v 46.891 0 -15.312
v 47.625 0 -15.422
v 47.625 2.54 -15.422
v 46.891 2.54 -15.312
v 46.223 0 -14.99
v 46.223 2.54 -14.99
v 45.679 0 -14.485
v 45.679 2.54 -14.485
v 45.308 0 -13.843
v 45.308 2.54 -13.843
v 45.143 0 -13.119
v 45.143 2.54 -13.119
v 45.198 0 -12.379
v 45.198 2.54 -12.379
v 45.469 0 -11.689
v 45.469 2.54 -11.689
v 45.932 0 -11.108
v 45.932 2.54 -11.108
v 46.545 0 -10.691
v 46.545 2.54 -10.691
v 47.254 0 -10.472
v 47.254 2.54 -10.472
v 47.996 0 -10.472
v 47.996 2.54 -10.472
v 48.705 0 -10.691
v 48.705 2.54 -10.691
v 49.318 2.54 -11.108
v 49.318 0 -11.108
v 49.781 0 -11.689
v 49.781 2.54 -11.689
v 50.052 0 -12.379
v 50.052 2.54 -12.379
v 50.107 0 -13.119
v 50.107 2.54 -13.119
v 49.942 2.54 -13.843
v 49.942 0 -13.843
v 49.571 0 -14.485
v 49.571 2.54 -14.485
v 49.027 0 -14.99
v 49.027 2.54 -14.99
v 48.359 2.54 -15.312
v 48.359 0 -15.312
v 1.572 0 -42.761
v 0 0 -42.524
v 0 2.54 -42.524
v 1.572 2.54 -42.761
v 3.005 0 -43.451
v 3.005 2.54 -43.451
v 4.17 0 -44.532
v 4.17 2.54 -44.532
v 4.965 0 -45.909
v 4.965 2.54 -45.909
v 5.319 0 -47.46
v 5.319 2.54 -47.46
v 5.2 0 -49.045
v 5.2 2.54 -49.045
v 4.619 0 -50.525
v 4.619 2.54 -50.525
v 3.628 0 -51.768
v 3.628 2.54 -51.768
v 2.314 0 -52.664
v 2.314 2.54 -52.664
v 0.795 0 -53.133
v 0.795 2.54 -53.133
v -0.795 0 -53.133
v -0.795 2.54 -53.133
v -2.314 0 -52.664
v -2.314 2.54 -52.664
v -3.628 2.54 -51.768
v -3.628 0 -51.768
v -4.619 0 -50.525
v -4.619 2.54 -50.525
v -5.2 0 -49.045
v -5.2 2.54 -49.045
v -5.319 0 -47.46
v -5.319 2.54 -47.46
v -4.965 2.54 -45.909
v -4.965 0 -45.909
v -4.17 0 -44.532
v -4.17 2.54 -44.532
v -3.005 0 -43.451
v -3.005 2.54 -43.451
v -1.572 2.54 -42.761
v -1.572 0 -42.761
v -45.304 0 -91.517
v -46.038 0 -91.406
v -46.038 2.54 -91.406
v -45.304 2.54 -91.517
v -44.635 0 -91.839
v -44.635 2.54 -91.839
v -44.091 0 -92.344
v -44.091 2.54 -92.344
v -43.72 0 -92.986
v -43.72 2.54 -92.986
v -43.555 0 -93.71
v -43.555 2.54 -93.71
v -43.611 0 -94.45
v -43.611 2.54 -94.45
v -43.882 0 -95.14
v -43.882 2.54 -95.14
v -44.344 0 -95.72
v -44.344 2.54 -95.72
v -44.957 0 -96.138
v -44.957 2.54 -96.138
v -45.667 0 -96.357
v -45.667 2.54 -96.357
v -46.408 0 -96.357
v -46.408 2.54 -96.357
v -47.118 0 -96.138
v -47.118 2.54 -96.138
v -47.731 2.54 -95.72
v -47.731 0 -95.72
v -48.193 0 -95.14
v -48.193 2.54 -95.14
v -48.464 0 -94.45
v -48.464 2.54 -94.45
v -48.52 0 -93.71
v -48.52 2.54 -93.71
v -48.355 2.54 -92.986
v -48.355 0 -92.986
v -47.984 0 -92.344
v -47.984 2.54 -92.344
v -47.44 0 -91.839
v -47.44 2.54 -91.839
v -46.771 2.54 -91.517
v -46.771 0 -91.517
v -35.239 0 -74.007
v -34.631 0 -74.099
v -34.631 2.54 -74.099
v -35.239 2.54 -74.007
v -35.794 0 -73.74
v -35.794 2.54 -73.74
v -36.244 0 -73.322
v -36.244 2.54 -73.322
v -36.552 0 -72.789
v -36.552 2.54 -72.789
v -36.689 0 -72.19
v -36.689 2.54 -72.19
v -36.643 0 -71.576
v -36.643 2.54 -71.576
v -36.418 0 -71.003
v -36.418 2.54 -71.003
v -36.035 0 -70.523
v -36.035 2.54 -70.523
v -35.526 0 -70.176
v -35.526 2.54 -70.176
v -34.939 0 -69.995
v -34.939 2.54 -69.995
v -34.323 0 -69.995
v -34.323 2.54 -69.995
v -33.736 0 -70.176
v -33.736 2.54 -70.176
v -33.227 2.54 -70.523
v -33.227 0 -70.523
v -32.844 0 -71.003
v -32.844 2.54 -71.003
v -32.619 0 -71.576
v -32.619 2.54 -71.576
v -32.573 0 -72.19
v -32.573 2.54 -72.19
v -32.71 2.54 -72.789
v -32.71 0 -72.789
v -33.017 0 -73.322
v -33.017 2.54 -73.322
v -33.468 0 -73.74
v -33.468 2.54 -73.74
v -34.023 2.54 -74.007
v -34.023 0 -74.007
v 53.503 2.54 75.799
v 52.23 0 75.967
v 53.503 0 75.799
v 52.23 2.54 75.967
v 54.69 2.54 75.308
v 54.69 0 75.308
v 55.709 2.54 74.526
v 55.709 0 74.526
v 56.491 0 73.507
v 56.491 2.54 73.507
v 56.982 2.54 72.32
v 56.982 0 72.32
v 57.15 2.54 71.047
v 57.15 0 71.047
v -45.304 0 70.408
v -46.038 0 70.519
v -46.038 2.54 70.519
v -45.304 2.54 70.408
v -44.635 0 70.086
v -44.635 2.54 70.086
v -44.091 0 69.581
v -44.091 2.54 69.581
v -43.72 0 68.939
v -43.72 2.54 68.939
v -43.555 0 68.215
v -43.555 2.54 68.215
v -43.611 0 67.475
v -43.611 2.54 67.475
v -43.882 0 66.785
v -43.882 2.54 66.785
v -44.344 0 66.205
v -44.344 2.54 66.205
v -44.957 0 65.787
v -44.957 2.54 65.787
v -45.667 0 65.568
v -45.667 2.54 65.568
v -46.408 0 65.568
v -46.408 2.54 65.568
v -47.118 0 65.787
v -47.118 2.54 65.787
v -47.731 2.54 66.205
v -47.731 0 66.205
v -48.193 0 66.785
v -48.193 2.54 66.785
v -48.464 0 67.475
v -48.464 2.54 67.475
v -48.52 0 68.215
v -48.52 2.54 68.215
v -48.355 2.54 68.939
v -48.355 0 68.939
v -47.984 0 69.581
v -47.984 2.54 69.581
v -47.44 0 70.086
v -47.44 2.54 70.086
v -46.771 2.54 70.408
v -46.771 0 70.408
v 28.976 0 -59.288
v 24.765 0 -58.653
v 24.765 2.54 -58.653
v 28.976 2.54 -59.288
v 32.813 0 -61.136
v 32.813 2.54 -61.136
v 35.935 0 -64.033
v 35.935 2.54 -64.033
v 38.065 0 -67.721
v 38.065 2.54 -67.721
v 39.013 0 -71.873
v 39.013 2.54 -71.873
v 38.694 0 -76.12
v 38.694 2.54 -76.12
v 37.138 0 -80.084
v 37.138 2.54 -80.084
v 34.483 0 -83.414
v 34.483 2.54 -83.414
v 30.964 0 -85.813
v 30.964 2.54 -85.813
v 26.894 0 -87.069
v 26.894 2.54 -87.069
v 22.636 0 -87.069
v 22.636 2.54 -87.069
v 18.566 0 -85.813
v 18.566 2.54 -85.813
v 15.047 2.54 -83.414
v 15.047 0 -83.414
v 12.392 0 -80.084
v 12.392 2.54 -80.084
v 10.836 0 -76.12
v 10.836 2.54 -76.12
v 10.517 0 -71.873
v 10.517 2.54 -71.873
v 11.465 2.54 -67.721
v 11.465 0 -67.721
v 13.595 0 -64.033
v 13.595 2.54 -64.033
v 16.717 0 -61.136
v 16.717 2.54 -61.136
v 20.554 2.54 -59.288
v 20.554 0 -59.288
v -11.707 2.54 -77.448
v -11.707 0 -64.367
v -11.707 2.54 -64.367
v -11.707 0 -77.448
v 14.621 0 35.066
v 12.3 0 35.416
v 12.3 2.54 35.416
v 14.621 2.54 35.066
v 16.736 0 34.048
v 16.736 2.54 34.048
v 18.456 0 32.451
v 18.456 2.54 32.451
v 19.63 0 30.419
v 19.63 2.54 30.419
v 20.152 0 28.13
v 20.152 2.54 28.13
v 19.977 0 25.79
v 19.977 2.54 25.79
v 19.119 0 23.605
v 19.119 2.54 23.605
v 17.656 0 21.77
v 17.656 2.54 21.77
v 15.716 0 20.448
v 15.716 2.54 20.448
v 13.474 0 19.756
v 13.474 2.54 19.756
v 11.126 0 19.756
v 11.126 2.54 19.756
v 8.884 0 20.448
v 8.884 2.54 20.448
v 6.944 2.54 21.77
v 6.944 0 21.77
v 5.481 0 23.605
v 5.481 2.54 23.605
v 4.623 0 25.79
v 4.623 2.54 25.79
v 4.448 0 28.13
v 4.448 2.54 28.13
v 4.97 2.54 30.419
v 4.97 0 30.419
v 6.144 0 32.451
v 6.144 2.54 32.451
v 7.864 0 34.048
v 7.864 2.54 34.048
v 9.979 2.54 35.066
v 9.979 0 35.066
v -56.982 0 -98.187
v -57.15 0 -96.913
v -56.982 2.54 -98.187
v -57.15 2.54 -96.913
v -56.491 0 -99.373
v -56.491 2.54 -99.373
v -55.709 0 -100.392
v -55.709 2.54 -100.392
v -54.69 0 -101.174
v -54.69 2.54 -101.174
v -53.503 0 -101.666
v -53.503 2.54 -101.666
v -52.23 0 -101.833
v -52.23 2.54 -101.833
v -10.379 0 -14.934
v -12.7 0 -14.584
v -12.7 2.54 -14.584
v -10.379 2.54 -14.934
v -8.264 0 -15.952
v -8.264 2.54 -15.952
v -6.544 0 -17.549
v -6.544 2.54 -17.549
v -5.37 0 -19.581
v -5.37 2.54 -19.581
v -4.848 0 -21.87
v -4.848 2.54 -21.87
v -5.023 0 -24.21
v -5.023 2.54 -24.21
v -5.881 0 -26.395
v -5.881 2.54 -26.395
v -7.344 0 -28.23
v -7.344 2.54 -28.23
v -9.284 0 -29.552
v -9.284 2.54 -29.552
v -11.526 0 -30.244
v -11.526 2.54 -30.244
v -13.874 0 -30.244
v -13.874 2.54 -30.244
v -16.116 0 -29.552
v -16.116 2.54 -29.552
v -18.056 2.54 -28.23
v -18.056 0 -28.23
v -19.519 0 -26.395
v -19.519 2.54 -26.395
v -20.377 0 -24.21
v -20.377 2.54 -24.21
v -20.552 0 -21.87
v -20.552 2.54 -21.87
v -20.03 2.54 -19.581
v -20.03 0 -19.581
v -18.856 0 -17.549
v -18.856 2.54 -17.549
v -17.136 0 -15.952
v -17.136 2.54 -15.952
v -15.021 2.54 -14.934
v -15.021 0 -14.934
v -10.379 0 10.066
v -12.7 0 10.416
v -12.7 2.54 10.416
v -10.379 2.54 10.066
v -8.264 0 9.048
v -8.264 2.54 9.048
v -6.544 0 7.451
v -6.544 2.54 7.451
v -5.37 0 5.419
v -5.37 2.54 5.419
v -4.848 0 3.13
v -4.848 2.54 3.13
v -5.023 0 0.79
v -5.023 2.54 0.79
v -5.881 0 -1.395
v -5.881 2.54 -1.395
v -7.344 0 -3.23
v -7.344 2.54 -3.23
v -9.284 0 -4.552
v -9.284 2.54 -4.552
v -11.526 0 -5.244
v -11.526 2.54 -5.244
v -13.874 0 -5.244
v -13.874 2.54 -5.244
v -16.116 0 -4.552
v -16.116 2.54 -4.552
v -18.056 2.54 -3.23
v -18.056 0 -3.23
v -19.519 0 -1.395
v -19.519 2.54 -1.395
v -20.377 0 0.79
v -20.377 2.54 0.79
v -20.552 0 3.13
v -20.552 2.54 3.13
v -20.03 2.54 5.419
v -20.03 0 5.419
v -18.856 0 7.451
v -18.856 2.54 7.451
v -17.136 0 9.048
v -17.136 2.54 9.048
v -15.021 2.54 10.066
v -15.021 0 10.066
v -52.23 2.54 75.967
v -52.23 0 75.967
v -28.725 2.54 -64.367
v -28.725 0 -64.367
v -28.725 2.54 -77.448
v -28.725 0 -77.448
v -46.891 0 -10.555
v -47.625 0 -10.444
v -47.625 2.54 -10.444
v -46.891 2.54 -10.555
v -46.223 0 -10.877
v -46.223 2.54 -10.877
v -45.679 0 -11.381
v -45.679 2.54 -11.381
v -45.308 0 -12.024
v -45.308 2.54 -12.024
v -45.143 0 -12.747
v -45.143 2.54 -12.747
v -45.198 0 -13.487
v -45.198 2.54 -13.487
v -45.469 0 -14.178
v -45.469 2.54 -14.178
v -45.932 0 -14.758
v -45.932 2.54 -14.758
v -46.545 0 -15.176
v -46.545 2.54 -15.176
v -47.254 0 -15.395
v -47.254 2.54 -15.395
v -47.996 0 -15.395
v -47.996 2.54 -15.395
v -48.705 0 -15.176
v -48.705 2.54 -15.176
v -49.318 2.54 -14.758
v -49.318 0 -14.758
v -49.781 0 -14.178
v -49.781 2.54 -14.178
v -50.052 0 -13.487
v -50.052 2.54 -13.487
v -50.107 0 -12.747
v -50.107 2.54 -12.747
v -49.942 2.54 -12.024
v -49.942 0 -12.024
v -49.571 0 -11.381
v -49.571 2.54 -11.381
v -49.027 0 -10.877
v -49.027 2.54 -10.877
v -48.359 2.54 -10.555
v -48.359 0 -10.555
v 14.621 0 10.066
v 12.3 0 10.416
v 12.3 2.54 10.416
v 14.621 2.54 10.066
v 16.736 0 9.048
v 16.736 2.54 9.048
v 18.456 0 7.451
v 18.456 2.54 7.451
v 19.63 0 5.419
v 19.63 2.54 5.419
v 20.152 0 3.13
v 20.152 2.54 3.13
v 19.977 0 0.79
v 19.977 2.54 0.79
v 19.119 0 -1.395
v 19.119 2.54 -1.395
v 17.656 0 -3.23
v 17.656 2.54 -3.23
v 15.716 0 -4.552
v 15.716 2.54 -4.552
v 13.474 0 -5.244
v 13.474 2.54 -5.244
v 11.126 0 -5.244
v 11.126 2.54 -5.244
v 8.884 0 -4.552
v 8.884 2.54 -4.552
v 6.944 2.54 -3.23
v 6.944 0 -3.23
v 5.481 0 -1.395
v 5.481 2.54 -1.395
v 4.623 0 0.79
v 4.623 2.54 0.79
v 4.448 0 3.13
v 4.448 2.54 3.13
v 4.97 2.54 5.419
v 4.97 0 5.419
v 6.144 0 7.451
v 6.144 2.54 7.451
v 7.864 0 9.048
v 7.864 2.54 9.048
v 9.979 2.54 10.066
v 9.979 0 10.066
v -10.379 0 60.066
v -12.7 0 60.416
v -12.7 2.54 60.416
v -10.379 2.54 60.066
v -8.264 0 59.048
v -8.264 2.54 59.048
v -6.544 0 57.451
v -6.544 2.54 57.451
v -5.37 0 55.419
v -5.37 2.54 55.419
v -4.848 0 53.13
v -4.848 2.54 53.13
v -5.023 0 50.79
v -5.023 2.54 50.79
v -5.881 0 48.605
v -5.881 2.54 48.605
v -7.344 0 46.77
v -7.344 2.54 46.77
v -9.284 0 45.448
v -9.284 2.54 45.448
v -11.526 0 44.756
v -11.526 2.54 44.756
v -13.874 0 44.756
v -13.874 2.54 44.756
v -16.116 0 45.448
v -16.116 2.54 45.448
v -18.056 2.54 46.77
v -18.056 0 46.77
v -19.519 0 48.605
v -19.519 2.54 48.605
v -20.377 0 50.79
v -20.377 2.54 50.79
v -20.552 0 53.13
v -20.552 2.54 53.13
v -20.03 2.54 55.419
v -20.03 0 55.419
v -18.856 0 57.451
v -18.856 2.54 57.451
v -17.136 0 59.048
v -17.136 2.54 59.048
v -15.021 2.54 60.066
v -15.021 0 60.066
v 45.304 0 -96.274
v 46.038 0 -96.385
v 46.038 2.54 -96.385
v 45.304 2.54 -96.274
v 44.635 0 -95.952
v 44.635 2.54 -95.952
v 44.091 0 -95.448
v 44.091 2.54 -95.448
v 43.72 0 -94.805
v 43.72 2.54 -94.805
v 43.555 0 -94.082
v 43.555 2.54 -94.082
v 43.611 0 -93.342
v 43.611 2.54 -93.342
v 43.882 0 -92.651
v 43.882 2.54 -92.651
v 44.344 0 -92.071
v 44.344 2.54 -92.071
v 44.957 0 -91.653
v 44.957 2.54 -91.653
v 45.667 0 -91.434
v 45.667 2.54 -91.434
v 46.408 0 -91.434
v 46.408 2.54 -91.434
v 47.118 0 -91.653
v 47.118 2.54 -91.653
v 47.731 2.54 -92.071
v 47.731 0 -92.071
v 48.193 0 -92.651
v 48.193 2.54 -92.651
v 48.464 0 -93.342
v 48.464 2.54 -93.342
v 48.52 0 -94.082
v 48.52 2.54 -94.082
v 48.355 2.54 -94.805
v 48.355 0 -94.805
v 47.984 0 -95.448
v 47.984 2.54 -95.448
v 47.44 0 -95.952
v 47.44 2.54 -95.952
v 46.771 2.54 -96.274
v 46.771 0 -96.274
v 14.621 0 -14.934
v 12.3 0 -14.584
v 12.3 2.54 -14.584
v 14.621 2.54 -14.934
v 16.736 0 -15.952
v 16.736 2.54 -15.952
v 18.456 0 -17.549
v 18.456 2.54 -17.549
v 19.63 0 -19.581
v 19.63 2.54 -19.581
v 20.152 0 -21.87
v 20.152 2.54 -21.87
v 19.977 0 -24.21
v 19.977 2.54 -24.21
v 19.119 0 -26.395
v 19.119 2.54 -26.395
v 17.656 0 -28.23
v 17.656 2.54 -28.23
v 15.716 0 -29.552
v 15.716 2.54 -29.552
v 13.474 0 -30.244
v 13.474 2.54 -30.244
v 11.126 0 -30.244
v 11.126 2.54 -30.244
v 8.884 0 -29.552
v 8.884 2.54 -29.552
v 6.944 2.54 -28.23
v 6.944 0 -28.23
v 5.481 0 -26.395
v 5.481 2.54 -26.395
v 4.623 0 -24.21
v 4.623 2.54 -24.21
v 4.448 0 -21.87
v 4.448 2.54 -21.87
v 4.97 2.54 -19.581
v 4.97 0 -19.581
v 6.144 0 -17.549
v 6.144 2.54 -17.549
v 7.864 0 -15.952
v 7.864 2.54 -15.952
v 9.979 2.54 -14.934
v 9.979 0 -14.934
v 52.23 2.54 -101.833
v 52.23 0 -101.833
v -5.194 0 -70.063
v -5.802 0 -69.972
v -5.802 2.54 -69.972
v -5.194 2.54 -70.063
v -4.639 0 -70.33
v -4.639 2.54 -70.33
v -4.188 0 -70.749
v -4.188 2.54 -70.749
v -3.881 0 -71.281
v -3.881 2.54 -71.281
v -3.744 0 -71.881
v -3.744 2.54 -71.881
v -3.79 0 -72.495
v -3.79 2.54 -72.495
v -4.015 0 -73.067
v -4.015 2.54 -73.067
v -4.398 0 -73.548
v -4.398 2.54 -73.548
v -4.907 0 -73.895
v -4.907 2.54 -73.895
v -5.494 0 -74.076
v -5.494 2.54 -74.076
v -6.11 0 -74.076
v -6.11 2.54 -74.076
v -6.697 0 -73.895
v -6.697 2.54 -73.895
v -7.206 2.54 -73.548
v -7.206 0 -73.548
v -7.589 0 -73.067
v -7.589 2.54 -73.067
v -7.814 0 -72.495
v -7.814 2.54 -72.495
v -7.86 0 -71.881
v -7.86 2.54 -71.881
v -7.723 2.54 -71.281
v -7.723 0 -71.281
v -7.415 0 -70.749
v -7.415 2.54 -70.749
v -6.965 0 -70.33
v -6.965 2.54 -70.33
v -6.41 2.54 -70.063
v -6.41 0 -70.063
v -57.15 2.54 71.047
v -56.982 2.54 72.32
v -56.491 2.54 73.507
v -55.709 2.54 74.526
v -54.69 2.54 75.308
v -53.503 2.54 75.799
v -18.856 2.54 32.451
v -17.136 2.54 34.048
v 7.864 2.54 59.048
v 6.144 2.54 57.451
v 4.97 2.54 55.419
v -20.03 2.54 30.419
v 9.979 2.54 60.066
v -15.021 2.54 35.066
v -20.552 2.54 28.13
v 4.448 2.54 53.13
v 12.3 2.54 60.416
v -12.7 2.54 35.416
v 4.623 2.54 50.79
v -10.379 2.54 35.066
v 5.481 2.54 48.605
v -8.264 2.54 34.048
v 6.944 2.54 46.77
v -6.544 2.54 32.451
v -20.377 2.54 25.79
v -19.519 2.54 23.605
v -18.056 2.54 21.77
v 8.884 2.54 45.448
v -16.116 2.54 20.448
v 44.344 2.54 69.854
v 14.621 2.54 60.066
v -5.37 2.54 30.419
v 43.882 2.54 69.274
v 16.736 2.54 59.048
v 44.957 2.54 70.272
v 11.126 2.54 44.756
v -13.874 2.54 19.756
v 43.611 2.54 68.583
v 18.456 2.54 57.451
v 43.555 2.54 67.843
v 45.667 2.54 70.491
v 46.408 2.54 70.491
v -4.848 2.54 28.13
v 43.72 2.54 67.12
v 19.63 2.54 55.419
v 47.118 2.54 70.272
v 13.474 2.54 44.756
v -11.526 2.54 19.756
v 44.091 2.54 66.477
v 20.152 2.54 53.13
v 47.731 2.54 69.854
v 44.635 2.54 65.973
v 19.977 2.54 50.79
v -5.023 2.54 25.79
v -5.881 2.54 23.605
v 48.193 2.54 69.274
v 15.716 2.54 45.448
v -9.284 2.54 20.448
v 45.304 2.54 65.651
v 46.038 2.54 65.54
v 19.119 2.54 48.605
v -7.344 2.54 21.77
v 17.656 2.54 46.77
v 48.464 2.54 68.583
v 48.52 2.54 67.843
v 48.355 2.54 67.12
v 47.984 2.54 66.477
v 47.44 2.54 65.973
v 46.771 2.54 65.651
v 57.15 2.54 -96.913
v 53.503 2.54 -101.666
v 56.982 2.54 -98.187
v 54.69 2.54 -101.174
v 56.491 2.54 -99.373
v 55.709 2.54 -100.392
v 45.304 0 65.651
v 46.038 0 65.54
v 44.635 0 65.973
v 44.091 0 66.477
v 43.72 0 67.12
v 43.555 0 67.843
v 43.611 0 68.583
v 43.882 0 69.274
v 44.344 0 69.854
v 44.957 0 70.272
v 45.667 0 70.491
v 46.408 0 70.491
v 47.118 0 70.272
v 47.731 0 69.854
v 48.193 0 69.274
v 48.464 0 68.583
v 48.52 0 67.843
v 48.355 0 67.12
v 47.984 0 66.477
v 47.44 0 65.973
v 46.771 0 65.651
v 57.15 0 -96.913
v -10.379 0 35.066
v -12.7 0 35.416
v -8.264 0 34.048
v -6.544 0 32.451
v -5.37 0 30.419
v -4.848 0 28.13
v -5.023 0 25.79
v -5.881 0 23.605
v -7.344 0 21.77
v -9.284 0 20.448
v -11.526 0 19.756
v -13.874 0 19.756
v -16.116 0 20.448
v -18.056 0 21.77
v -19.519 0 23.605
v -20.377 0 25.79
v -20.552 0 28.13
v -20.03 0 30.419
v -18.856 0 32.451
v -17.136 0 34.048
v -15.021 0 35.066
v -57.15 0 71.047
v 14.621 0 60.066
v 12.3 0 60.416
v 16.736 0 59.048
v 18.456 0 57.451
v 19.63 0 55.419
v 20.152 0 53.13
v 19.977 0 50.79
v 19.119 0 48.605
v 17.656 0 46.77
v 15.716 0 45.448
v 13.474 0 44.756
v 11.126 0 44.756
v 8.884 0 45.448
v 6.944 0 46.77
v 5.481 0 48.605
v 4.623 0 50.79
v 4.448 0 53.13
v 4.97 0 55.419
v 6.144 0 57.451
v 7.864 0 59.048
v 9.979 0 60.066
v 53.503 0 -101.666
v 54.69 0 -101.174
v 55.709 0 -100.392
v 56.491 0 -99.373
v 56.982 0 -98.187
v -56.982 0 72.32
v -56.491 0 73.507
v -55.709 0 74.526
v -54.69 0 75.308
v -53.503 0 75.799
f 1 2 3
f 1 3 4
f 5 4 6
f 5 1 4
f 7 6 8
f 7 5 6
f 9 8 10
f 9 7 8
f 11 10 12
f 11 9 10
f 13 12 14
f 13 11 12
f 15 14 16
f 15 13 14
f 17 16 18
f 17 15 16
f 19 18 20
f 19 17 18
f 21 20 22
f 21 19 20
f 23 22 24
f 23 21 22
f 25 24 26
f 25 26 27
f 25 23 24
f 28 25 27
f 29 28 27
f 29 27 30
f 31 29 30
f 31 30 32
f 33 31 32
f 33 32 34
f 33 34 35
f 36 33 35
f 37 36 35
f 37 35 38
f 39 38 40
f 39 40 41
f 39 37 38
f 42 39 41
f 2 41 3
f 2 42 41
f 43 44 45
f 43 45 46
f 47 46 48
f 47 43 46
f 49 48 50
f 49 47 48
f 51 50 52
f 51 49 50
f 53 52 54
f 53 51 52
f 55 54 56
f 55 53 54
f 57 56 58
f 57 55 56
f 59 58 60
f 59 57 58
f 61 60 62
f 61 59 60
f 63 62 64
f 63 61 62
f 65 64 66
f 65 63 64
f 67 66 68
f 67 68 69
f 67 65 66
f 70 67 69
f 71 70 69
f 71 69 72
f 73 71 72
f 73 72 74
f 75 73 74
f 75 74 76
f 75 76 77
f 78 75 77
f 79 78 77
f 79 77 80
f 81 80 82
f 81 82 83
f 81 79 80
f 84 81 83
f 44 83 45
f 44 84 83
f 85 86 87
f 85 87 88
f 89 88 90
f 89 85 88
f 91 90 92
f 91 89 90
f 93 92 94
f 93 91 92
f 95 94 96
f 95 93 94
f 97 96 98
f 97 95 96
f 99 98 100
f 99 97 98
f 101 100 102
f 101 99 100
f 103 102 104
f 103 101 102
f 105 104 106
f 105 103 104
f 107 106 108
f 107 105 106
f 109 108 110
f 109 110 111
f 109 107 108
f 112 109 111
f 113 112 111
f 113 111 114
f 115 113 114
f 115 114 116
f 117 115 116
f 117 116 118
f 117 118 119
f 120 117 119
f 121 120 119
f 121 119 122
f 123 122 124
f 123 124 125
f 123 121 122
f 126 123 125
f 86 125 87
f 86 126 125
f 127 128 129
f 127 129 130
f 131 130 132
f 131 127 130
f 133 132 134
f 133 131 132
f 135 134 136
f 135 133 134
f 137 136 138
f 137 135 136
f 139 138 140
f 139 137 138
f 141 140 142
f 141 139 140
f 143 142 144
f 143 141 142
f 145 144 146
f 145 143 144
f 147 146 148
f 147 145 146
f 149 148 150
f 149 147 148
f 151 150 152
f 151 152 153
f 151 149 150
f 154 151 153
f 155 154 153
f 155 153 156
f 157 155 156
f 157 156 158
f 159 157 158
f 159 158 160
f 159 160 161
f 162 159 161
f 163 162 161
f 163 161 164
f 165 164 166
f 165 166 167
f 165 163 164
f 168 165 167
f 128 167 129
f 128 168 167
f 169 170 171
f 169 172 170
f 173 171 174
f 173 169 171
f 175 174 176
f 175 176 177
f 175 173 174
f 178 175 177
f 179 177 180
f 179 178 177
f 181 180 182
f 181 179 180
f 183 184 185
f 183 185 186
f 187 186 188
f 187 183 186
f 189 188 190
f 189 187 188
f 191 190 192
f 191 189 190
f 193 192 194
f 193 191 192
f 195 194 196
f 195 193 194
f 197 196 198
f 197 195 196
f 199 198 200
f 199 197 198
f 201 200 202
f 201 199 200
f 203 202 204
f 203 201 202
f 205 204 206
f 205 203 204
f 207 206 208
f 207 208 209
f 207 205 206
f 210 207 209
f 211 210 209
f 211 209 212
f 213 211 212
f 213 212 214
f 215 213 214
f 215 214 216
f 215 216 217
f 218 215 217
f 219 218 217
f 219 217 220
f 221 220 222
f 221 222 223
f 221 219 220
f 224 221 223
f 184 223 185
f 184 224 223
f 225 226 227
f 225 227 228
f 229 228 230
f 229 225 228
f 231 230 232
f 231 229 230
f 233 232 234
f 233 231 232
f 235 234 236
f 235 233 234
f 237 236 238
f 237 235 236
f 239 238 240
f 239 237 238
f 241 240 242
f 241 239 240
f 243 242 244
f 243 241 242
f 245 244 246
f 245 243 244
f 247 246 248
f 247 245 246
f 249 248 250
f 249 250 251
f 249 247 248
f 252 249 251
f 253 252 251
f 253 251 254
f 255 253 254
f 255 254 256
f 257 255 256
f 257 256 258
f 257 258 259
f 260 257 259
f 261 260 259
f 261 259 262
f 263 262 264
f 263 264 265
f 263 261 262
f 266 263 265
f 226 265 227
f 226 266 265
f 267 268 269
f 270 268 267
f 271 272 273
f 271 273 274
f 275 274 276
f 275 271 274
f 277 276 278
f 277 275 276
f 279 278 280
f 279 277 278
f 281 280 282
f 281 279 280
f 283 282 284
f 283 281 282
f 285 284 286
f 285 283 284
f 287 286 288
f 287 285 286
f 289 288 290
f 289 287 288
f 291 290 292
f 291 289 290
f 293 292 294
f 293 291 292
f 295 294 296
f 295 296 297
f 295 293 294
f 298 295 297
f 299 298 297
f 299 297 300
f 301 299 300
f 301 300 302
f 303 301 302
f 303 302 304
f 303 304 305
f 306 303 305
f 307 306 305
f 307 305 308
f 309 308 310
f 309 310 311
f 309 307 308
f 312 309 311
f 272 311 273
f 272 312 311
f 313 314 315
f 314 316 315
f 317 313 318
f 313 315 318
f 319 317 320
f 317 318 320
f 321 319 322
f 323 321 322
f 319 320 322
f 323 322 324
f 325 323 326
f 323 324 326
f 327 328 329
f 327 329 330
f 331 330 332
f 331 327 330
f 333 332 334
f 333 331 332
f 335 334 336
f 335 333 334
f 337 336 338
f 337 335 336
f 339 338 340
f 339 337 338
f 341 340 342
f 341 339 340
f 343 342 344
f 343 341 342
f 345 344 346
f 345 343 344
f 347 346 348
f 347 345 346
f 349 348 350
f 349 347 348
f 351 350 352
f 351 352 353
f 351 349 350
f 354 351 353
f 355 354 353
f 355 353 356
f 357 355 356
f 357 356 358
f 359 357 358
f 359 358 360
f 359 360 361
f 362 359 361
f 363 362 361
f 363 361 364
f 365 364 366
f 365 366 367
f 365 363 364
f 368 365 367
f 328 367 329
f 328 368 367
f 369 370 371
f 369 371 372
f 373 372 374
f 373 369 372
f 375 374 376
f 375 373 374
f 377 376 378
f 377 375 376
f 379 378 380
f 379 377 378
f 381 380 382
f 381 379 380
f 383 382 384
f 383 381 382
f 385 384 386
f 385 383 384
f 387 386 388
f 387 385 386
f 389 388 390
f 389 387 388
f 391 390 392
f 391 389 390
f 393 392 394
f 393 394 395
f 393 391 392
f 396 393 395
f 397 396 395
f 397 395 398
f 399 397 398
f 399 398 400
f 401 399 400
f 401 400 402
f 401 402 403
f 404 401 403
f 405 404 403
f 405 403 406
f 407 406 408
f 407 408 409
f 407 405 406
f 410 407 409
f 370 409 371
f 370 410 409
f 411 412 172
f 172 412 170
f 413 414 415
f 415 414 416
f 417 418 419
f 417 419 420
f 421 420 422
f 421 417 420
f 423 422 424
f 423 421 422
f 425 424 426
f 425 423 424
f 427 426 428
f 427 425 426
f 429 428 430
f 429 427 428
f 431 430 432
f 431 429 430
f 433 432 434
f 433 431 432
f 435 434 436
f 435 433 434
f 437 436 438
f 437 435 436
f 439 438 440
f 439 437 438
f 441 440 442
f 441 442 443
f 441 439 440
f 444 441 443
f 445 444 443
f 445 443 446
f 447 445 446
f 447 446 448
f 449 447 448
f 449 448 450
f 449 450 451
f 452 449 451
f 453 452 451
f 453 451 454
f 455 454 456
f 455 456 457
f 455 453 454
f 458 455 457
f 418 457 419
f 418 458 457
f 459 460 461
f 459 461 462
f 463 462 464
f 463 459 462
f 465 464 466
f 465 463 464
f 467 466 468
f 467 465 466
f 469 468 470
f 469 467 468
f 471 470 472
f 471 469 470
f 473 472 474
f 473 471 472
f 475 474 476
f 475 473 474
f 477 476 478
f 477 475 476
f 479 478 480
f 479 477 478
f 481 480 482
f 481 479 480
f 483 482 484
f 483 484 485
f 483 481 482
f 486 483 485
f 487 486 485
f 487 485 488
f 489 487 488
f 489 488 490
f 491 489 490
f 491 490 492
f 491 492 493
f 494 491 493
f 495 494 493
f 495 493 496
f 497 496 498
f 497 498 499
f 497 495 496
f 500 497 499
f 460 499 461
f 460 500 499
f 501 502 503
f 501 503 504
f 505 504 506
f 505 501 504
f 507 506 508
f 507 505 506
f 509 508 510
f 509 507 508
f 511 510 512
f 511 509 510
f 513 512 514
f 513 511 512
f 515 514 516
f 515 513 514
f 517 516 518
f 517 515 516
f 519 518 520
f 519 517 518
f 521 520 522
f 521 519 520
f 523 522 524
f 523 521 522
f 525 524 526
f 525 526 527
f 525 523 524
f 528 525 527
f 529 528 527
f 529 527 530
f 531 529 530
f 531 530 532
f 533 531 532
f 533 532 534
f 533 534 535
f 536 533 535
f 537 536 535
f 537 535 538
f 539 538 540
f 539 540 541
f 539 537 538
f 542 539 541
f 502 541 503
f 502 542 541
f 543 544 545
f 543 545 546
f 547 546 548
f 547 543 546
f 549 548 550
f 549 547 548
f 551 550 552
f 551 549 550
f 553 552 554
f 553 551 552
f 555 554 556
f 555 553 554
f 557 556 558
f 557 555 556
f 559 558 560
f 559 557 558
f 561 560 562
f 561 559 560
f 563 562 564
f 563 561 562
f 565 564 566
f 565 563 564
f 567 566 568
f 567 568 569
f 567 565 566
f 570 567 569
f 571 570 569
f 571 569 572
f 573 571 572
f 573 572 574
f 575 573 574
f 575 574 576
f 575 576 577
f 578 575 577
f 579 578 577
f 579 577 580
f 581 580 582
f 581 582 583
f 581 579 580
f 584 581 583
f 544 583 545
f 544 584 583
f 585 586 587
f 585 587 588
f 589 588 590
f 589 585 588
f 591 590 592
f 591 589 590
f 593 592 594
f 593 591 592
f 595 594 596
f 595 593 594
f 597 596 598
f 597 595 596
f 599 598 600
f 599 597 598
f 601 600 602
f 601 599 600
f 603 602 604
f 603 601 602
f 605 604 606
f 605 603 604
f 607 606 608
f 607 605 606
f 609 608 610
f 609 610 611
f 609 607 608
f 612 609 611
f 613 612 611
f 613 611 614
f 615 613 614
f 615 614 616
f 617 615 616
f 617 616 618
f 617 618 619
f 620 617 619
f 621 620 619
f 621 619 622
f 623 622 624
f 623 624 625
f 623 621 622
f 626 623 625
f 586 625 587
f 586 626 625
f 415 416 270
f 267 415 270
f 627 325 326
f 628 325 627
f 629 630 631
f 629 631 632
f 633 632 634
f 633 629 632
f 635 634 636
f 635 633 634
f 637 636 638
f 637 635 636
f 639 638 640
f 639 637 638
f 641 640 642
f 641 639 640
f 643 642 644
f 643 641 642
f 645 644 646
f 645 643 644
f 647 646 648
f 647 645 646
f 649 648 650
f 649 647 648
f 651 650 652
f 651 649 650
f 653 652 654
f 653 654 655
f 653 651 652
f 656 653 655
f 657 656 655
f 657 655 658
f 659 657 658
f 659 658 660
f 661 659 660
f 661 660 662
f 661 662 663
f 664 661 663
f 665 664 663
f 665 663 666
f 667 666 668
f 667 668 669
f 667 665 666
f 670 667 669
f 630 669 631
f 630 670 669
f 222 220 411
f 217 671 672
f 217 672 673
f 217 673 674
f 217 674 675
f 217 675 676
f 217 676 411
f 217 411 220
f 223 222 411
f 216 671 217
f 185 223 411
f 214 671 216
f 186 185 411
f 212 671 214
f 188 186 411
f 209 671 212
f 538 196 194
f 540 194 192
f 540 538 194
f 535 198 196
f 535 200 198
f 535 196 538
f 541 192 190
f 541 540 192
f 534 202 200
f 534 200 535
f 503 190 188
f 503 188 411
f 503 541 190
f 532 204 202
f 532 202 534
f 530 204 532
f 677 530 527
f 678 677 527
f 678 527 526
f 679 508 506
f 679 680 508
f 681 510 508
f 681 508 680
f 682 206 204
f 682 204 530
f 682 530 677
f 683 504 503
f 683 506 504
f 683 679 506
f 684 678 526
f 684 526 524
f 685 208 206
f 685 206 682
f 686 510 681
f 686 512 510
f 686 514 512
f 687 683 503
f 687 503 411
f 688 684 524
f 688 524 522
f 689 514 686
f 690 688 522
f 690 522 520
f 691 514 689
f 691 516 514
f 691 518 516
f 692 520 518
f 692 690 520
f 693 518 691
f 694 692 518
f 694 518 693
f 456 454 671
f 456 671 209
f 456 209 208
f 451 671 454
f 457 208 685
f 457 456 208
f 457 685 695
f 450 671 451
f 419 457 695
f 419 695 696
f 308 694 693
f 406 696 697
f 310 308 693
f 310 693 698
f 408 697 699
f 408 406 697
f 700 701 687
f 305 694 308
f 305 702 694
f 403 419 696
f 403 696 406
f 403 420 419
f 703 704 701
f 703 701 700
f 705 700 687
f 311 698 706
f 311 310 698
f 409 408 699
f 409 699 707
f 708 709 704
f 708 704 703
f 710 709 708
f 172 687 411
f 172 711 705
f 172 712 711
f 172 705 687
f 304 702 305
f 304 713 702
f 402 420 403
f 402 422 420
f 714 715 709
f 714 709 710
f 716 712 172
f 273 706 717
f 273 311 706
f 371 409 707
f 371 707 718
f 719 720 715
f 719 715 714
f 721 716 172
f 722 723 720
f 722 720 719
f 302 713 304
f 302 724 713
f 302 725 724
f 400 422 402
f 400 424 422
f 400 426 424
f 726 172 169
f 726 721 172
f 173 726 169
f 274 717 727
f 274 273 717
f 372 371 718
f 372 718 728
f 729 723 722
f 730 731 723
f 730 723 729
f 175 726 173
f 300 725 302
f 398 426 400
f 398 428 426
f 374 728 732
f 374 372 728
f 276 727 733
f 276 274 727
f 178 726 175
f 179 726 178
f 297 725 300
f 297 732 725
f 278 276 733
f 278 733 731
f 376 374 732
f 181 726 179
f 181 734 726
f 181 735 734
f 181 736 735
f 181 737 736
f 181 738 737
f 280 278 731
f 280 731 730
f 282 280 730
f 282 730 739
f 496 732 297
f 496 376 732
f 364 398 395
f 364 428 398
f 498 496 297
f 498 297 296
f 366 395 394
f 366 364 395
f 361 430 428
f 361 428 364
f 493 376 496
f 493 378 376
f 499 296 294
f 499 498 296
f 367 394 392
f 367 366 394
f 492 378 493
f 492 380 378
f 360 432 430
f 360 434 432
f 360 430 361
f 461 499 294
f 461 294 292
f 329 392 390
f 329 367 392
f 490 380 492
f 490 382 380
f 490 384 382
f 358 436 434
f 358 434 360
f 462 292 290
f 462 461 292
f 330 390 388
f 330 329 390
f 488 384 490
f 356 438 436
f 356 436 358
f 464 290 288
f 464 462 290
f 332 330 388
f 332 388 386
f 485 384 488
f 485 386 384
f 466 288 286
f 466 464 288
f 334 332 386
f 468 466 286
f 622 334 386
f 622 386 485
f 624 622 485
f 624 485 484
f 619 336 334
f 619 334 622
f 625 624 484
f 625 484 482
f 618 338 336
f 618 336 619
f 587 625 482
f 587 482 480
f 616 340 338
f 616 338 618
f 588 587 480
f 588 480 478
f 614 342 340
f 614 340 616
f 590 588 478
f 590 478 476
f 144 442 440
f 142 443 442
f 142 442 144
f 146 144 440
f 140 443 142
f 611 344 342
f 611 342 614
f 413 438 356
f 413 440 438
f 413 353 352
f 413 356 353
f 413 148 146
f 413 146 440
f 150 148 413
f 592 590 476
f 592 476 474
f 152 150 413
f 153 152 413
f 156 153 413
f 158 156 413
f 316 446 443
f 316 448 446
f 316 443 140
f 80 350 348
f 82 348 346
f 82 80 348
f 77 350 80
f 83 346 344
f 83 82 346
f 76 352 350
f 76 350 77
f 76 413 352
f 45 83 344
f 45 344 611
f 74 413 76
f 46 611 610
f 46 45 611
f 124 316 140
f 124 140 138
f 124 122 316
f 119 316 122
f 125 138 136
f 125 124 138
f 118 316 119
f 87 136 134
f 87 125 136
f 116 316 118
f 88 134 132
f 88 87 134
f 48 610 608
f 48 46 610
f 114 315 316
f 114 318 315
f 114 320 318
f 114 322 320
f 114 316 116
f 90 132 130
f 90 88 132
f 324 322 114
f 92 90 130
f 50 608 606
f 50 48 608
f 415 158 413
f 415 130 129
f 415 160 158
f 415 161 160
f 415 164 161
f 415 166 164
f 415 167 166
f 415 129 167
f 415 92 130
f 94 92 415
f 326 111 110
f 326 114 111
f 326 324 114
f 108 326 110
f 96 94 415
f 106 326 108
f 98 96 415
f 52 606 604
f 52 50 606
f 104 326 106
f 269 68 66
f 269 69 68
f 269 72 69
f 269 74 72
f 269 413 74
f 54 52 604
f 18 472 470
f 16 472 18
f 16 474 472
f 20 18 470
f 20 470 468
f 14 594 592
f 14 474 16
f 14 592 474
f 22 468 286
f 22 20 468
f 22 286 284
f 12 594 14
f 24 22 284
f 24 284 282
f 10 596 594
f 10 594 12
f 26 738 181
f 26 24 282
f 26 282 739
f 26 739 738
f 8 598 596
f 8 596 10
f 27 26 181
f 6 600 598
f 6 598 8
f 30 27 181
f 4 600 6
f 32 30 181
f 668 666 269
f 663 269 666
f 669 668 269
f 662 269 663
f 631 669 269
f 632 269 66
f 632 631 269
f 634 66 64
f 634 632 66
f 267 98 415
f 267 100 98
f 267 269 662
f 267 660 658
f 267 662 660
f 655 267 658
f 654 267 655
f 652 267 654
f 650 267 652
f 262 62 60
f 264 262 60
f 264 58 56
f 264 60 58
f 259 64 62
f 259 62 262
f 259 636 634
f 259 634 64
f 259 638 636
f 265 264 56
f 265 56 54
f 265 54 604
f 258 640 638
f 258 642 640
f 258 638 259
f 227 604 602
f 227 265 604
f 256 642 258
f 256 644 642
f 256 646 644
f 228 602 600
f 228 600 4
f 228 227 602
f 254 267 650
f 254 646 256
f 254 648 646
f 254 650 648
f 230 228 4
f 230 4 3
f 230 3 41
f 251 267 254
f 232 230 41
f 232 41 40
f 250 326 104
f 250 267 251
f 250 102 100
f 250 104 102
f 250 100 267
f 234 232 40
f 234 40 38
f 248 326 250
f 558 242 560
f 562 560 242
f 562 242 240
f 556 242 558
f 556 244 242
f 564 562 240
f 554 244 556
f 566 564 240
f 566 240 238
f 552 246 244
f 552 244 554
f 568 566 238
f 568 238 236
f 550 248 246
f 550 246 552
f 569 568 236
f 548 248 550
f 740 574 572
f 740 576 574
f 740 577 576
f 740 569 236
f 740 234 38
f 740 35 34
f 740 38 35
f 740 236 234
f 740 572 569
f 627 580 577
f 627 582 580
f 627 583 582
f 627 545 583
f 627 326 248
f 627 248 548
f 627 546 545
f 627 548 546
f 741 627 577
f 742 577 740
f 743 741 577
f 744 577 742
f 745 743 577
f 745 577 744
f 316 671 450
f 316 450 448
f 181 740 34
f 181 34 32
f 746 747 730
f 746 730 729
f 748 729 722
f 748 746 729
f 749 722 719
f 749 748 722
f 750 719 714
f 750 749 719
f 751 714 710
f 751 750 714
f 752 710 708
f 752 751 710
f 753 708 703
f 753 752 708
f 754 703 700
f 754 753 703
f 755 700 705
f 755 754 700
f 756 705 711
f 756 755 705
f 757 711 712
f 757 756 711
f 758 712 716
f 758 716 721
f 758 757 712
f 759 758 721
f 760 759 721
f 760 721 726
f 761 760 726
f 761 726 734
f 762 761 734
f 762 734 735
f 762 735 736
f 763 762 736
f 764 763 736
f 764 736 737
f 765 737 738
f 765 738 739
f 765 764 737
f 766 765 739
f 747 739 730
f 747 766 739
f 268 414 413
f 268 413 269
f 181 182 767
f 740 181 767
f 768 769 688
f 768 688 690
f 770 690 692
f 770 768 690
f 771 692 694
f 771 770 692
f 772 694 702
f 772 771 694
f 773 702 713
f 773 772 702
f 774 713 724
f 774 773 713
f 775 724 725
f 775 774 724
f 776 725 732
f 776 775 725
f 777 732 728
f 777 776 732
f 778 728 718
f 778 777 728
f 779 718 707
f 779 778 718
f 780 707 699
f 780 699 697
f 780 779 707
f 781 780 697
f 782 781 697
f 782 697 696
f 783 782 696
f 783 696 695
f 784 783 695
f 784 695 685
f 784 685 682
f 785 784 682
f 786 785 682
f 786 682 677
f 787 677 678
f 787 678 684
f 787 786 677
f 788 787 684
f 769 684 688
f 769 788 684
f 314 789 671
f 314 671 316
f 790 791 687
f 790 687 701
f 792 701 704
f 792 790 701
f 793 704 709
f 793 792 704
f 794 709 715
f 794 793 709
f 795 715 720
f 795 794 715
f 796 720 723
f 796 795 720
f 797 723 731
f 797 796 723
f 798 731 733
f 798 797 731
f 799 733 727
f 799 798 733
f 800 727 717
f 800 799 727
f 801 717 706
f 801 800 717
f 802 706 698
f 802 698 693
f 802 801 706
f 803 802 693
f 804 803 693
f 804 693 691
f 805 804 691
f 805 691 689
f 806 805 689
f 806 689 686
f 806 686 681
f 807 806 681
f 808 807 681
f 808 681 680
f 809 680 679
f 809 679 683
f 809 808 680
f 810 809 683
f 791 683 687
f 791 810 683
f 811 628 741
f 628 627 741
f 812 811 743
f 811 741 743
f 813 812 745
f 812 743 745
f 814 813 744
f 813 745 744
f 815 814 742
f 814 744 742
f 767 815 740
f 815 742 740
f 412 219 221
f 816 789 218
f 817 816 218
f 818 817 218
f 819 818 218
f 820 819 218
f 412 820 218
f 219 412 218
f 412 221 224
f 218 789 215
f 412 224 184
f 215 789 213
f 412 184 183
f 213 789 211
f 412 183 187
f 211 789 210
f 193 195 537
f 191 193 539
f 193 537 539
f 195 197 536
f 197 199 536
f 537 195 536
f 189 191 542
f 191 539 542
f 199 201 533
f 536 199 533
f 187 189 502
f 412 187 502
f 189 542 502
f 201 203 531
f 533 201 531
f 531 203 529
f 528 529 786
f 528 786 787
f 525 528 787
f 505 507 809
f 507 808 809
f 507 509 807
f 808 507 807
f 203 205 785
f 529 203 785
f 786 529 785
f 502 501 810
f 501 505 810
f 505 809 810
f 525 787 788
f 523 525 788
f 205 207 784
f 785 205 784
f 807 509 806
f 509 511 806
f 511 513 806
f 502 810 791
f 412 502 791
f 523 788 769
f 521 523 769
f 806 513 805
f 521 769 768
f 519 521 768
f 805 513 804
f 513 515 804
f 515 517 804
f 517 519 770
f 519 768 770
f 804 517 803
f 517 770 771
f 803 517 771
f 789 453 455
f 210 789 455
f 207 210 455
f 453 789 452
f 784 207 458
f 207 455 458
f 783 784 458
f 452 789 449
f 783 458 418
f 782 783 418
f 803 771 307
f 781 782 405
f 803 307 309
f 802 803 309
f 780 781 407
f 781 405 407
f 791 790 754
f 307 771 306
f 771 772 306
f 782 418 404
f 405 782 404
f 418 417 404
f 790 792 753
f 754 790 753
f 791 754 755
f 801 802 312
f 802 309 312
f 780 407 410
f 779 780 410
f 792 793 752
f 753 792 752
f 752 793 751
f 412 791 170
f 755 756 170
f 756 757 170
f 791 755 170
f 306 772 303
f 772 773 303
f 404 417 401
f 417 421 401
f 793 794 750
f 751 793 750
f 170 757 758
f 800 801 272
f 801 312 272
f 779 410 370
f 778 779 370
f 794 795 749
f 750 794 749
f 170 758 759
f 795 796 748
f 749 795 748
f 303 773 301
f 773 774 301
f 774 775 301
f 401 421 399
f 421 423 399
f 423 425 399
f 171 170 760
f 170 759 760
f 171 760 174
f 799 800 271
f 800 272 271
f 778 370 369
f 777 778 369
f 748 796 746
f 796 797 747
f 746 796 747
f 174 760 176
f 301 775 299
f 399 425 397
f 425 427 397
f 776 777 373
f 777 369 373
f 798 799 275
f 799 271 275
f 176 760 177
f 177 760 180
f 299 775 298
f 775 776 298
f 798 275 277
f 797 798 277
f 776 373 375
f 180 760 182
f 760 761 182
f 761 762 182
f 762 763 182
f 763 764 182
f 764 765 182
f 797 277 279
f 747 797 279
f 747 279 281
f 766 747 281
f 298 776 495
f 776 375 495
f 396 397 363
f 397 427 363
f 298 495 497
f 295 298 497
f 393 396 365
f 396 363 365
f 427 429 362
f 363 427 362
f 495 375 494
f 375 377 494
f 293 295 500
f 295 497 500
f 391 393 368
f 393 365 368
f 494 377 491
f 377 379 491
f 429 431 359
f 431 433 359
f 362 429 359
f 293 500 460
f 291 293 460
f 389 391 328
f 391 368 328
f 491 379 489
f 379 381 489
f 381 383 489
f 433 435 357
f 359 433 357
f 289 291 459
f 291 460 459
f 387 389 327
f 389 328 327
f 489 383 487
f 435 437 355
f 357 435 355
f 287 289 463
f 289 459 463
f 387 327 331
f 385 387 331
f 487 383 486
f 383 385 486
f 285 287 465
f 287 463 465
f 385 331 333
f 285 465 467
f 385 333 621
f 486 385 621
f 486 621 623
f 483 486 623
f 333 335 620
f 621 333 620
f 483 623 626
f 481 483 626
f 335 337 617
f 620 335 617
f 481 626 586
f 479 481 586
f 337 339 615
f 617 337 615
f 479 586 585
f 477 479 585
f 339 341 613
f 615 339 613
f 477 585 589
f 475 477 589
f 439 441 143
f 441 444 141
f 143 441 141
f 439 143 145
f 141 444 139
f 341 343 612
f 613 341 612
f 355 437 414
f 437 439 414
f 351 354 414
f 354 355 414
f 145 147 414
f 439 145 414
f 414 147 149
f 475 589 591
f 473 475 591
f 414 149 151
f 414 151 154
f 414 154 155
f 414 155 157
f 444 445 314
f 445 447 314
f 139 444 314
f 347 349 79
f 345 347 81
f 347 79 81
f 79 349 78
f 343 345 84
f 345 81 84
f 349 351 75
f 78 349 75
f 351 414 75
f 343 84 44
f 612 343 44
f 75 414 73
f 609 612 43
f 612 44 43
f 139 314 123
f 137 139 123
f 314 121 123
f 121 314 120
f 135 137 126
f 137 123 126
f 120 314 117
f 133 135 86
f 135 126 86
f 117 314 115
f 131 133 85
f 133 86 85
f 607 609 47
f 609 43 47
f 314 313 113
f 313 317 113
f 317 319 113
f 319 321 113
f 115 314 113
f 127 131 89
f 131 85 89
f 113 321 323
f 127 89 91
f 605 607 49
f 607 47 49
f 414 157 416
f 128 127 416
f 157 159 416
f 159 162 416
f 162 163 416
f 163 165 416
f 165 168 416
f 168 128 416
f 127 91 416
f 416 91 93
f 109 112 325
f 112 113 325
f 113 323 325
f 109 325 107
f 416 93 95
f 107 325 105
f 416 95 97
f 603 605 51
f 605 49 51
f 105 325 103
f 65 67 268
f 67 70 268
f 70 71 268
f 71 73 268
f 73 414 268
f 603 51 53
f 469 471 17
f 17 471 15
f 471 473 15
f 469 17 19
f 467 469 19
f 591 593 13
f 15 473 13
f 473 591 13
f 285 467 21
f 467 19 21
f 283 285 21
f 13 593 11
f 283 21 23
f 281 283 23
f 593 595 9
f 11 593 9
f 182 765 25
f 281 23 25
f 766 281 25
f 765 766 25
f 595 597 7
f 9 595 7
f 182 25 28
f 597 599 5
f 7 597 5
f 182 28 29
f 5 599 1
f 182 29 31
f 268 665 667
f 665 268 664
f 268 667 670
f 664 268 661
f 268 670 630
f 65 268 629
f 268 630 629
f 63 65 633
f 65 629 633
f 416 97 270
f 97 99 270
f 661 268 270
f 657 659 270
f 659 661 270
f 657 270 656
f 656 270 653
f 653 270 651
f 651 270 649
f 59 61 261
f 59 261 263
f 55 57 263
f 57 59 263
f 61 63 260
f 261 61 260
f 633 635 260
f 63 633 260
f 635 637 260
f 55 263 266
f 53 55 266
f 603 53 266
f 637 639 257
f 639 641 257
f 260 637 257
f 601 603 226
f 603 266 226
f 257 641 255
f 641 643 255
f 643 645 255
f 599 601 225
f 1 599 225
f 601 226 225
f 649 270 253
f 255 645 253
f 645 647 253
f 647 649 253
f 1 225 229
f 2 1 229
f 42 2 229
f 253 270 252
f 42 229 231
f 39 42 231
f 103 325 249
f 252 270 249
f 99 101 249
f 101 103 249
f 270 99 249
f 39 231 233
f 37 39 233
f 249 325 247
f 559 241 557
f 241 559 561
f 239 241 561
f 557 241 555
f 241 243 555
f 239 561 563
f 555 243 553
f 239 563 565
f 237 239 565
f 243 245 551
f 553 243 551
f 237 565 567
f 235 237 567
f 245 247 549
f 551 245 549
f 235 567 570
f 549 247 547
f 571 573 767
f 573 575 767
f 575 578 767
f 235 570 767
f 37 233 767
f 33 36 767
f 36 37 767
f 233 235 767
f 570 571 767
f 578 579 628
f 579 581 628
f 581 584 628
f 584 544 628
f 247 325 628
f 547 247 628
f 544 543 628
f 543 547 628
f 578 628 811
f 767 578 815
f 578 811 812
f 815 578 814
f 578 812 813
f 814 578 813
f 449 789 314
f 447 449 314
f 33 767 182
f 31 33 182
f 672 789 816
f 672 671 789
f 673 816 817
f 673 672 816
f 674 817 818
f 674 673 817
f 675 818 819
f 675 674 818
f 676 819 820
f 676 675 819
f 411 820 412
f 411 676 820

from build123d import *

# Parameters (mm, degrees)
SKETCH1_W           = 114.3
SKETCH1_H           = 177.8
SKETCH1_R           = 7.874
SKETCH1_R_2         = 5.334
SKETCH1_R_3         = 14.2875
SKETCH1_R_4         = 2.4892
SKETCH1_R_5         = 2.06375
SKETCH1_W_2         = 17.018
SKETCH1_H_2         = 13.081
BOSS_EXTRUDE1_DEPTH = 2.54
FILLET1_R           = 4.92


with BuildPart() as part:
    # Sketch1 → Boss-Extrude1 (new body)
    with BuildSketch(Plane(origin=(0, 0, 0), x_dir=(1, 0, 0), z_dir=(0, 1, 0))):
        with Locations((0, 12.933192571)):
            Rectangle(SKETCH1_W, SKETCH1_H)
        with Locations(Location((-12.7, 22.458192571, 0), (0, 0, 270))):
            Circle(SKETCH1_R, mode=Mode.SUBTRACT)
        with Locations(Location((0, 47.858192571, 0), (0, 0, 270))):
            Circle(SKETCH1_R_2, mode=Mode.SUBTRACT)
        with Locations(Location((24.765, 72.940692571, 0), (0, 0, 270))):
            Circle(SKETCH1_R_3, mode=Mode.SUBTRACT)
        with Locations(Location((-46.0375, -68.029307429, 0), (0, 0, 270))):
            Circle(SKETCH1_R_4, mode=Mode.SUBTRACT)
        with Locations(Location((-46.0375, 93.895692571, 0), (0, 0, 270))):
            Circle(SKETCH1_R_4, mode=Mode.SUBTRACT)
        with Locations(Location((-47.625, 12.933192571, 0), (0, 0, 270))):
            Circle(SKETCH1_R_4, mode=Mode.SUBTRACT)
        with Locations(Location((46.0375, 93.895692571, 0), (0, 0, 90))):
            Circle(SKETCH1_R_4, mode=Mode.SUBTRACT)
        with Locations(Location((47.625, 12.933192571, 0), (0, 0, 90))):
            Circle(SKETCH1_R_4, mode=Mode.SUBTRACT)
        with Locations(Location((46.0375, -68.029307429, 0), (0, 0, 90))):
            Circle(SKETCH1_R_4, mode=Mode.SUBTRACT)
        with Locations(Location((-5.801987124, 72.035346476, 0), (0, 0, 270))):
            Circle(SKETCH1_R_5, mode=Mode.SUBTRACT)
        with Locations(Location((-34.630987124, 72.035346476, 0), (0, 0, 90))):
            Circle(SKETCH1_R_5, mode=Mode.SUBTRACT)
        with Locations(Location((12.3, 22.458192571, 0), (0, 0, 270))):
            Circle(SKETCH1_R, mode=Mode.SUBTRACT)
        with Locations(Location((12.3, -2.541807429, 0), (0, 0, 270))):
            Circle(SKETCH1_R, mode=Mode.SUBTRACT)
        with Locations(Location((12.3, -27.541807429, 0), (0, 0, 270))):
            Circle(SKETCH1_R, mode=Mode.SUBTRACT)
        with Locations(Location((12.3, -52.541807429, 0), (0, 0, 270))):
            Circle(SKETCH1_R, mode=Mode.SUBTRACT)
        with Locations(Location((-12.7, -2.541807429, 0), (0, 0, 270))):
            Circle(SKETCH1_R, mode=Mode.SUBTRACT)
        with Locations(Location((-12.7, -27.541807429, 0), (0, 0, 270))):
            Circle(SKETCH1_R, mode=Mode.SUBTRACT)
        with Locations(Location((-12.7, -52.541807429, 0), (0, 0, 270))):
            Circle(SKETCH1_R, mode=Mode.SUBTRACT)
        with Locations((-20.216487124, 70.907248902)):
            Rectangle(SKETCH1_W_2, SKETCH1_H_2, mode=Mode.SUBTRACT)
    extrude(amount=BOSS_EXTRUDE1_DEPTH)

    # Fillet1
    fillet1_edges = [part.edges().sort_by_distance(p)[0] for p in [
        (-57.15, 1.27, -101.833192571),
        (57.15, 1.27, -101.833192571),
        (57.15, 1.27, 75.966807429),
        (-57.15, 1.27, 75.966807429),
    ]]
    fillet(fillet1_edges, radius=FILLET1_R)


solid = part.part
